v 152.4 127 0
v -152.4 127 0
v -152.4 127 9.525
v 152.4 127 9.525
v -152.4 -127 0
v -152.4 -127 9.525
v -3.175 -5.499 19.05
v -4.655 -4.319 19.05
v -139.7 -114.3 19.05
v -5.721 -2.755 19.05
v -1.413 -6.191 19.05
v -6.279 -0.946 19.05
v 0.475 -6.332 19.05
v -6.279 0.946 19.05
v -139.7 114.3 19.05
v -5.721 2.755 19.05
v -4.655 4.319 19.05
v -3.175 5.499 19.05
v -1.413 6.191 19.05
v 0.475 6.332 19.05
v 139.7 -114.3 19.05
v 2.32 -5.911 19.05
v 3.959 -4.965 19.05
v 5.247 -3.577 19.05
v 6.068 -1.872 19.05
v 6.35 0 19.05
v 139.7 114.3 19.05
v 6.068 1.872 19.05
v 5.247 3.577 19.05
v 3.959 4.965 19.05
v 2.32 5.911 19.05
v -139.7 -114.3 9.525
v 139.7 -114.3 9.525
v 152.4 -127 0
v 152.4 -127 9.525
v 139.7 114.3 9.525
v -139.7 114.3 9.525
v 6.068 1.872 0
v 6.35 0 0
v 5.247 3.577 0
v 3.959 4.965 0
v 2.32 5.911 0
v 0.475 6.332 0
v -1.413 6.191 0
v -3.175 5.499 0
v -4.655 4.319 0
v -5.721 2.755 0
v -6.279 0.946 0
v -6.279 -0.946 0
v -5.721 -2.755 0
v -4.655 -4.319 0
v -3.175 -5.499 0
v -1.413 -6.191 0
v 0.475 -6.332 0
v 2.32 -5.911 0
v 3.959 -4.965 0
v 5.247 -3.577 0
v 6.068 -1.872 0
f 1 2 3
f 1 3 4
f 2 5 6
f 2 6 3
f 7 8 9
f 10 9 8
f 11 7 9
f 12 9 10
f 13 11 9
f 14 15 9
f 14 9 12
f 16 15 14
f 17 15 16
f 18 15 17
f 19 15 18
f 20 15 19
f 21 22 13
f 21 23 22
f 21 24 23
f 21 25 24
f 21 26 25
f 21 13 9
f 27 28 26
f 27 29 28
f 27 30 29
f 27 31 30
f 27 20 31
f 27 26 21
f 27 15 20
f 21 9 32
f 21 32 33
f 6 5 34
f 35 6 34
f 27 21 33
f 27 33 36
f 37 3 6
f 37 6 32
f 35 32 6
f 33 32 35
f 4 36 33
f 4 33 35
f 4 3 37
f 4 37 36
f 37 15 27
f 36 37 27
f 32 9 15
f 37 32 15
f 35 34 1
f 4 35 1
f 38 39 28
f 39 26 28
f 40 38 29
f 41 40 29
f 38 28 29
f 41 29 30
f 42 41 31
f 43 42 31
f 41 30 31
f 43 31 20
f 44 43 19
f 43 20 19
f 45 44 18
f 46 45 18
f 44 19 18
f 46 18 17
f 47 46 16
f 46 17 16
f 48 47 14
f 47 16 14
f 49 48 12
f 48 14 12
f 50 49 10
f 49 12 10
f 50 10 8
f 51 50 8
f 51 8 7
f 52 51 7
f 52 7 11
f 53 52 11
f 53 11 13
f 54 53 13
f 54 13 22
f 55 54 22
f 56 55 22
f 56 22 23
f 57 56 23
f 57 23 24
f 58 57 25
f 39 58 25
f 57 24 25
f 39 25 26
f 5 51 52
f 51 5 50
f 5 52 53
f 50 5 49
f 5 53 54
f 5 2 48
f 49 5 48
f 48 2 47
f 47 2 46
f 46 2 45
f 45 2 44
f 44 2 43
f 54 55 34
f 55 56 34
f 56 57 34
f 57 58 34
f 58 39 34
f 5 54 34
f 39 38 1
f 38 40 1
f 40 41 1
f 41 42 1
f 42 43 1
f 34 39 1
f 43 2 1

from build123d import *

# Parameters (mm, degrees)
F1_W     = 279.4
F1_H     = 228.6
F1_W_2   = 304.8
F1_H_2   = 254
F2_DEPTH = 9.525
F3_W     = 279.4
F3_H     = 228.6
F4_DEPTH = 9.525
F5_R     = 6.35
F6_DEPTH = 33.178601


with BuildPart() as f2:
    # F1 (on face) → F2 (new body)
    with BuildSketch(Plane.XY):
        Rectangle(F1_W, F1_H)
        Rectangle(F1_W_2, F1_H_2)
        Rectangle(F1_W, F1_H, mode=Mode.SUBTRACT)
    extrude(amount=F2_DEPTH)

    # F3 (on face) → F4 (join, symmetric)
    with BuildSketch(Plane.XY.offset(9.525)):
        Rectangle(F3_W, F3_H)
    extrude(amount=F4_DEPTH, both=True)

    # F5 (on face) → F6 (cut, symmetric)
    with BuildSketch(Plane.XY.offset(19.05)):
        Circle(F5_R)
    extrude(amount=F6_DEPTH, both=True, mode=Mode.SUBTRACT)


solid = f2.part
